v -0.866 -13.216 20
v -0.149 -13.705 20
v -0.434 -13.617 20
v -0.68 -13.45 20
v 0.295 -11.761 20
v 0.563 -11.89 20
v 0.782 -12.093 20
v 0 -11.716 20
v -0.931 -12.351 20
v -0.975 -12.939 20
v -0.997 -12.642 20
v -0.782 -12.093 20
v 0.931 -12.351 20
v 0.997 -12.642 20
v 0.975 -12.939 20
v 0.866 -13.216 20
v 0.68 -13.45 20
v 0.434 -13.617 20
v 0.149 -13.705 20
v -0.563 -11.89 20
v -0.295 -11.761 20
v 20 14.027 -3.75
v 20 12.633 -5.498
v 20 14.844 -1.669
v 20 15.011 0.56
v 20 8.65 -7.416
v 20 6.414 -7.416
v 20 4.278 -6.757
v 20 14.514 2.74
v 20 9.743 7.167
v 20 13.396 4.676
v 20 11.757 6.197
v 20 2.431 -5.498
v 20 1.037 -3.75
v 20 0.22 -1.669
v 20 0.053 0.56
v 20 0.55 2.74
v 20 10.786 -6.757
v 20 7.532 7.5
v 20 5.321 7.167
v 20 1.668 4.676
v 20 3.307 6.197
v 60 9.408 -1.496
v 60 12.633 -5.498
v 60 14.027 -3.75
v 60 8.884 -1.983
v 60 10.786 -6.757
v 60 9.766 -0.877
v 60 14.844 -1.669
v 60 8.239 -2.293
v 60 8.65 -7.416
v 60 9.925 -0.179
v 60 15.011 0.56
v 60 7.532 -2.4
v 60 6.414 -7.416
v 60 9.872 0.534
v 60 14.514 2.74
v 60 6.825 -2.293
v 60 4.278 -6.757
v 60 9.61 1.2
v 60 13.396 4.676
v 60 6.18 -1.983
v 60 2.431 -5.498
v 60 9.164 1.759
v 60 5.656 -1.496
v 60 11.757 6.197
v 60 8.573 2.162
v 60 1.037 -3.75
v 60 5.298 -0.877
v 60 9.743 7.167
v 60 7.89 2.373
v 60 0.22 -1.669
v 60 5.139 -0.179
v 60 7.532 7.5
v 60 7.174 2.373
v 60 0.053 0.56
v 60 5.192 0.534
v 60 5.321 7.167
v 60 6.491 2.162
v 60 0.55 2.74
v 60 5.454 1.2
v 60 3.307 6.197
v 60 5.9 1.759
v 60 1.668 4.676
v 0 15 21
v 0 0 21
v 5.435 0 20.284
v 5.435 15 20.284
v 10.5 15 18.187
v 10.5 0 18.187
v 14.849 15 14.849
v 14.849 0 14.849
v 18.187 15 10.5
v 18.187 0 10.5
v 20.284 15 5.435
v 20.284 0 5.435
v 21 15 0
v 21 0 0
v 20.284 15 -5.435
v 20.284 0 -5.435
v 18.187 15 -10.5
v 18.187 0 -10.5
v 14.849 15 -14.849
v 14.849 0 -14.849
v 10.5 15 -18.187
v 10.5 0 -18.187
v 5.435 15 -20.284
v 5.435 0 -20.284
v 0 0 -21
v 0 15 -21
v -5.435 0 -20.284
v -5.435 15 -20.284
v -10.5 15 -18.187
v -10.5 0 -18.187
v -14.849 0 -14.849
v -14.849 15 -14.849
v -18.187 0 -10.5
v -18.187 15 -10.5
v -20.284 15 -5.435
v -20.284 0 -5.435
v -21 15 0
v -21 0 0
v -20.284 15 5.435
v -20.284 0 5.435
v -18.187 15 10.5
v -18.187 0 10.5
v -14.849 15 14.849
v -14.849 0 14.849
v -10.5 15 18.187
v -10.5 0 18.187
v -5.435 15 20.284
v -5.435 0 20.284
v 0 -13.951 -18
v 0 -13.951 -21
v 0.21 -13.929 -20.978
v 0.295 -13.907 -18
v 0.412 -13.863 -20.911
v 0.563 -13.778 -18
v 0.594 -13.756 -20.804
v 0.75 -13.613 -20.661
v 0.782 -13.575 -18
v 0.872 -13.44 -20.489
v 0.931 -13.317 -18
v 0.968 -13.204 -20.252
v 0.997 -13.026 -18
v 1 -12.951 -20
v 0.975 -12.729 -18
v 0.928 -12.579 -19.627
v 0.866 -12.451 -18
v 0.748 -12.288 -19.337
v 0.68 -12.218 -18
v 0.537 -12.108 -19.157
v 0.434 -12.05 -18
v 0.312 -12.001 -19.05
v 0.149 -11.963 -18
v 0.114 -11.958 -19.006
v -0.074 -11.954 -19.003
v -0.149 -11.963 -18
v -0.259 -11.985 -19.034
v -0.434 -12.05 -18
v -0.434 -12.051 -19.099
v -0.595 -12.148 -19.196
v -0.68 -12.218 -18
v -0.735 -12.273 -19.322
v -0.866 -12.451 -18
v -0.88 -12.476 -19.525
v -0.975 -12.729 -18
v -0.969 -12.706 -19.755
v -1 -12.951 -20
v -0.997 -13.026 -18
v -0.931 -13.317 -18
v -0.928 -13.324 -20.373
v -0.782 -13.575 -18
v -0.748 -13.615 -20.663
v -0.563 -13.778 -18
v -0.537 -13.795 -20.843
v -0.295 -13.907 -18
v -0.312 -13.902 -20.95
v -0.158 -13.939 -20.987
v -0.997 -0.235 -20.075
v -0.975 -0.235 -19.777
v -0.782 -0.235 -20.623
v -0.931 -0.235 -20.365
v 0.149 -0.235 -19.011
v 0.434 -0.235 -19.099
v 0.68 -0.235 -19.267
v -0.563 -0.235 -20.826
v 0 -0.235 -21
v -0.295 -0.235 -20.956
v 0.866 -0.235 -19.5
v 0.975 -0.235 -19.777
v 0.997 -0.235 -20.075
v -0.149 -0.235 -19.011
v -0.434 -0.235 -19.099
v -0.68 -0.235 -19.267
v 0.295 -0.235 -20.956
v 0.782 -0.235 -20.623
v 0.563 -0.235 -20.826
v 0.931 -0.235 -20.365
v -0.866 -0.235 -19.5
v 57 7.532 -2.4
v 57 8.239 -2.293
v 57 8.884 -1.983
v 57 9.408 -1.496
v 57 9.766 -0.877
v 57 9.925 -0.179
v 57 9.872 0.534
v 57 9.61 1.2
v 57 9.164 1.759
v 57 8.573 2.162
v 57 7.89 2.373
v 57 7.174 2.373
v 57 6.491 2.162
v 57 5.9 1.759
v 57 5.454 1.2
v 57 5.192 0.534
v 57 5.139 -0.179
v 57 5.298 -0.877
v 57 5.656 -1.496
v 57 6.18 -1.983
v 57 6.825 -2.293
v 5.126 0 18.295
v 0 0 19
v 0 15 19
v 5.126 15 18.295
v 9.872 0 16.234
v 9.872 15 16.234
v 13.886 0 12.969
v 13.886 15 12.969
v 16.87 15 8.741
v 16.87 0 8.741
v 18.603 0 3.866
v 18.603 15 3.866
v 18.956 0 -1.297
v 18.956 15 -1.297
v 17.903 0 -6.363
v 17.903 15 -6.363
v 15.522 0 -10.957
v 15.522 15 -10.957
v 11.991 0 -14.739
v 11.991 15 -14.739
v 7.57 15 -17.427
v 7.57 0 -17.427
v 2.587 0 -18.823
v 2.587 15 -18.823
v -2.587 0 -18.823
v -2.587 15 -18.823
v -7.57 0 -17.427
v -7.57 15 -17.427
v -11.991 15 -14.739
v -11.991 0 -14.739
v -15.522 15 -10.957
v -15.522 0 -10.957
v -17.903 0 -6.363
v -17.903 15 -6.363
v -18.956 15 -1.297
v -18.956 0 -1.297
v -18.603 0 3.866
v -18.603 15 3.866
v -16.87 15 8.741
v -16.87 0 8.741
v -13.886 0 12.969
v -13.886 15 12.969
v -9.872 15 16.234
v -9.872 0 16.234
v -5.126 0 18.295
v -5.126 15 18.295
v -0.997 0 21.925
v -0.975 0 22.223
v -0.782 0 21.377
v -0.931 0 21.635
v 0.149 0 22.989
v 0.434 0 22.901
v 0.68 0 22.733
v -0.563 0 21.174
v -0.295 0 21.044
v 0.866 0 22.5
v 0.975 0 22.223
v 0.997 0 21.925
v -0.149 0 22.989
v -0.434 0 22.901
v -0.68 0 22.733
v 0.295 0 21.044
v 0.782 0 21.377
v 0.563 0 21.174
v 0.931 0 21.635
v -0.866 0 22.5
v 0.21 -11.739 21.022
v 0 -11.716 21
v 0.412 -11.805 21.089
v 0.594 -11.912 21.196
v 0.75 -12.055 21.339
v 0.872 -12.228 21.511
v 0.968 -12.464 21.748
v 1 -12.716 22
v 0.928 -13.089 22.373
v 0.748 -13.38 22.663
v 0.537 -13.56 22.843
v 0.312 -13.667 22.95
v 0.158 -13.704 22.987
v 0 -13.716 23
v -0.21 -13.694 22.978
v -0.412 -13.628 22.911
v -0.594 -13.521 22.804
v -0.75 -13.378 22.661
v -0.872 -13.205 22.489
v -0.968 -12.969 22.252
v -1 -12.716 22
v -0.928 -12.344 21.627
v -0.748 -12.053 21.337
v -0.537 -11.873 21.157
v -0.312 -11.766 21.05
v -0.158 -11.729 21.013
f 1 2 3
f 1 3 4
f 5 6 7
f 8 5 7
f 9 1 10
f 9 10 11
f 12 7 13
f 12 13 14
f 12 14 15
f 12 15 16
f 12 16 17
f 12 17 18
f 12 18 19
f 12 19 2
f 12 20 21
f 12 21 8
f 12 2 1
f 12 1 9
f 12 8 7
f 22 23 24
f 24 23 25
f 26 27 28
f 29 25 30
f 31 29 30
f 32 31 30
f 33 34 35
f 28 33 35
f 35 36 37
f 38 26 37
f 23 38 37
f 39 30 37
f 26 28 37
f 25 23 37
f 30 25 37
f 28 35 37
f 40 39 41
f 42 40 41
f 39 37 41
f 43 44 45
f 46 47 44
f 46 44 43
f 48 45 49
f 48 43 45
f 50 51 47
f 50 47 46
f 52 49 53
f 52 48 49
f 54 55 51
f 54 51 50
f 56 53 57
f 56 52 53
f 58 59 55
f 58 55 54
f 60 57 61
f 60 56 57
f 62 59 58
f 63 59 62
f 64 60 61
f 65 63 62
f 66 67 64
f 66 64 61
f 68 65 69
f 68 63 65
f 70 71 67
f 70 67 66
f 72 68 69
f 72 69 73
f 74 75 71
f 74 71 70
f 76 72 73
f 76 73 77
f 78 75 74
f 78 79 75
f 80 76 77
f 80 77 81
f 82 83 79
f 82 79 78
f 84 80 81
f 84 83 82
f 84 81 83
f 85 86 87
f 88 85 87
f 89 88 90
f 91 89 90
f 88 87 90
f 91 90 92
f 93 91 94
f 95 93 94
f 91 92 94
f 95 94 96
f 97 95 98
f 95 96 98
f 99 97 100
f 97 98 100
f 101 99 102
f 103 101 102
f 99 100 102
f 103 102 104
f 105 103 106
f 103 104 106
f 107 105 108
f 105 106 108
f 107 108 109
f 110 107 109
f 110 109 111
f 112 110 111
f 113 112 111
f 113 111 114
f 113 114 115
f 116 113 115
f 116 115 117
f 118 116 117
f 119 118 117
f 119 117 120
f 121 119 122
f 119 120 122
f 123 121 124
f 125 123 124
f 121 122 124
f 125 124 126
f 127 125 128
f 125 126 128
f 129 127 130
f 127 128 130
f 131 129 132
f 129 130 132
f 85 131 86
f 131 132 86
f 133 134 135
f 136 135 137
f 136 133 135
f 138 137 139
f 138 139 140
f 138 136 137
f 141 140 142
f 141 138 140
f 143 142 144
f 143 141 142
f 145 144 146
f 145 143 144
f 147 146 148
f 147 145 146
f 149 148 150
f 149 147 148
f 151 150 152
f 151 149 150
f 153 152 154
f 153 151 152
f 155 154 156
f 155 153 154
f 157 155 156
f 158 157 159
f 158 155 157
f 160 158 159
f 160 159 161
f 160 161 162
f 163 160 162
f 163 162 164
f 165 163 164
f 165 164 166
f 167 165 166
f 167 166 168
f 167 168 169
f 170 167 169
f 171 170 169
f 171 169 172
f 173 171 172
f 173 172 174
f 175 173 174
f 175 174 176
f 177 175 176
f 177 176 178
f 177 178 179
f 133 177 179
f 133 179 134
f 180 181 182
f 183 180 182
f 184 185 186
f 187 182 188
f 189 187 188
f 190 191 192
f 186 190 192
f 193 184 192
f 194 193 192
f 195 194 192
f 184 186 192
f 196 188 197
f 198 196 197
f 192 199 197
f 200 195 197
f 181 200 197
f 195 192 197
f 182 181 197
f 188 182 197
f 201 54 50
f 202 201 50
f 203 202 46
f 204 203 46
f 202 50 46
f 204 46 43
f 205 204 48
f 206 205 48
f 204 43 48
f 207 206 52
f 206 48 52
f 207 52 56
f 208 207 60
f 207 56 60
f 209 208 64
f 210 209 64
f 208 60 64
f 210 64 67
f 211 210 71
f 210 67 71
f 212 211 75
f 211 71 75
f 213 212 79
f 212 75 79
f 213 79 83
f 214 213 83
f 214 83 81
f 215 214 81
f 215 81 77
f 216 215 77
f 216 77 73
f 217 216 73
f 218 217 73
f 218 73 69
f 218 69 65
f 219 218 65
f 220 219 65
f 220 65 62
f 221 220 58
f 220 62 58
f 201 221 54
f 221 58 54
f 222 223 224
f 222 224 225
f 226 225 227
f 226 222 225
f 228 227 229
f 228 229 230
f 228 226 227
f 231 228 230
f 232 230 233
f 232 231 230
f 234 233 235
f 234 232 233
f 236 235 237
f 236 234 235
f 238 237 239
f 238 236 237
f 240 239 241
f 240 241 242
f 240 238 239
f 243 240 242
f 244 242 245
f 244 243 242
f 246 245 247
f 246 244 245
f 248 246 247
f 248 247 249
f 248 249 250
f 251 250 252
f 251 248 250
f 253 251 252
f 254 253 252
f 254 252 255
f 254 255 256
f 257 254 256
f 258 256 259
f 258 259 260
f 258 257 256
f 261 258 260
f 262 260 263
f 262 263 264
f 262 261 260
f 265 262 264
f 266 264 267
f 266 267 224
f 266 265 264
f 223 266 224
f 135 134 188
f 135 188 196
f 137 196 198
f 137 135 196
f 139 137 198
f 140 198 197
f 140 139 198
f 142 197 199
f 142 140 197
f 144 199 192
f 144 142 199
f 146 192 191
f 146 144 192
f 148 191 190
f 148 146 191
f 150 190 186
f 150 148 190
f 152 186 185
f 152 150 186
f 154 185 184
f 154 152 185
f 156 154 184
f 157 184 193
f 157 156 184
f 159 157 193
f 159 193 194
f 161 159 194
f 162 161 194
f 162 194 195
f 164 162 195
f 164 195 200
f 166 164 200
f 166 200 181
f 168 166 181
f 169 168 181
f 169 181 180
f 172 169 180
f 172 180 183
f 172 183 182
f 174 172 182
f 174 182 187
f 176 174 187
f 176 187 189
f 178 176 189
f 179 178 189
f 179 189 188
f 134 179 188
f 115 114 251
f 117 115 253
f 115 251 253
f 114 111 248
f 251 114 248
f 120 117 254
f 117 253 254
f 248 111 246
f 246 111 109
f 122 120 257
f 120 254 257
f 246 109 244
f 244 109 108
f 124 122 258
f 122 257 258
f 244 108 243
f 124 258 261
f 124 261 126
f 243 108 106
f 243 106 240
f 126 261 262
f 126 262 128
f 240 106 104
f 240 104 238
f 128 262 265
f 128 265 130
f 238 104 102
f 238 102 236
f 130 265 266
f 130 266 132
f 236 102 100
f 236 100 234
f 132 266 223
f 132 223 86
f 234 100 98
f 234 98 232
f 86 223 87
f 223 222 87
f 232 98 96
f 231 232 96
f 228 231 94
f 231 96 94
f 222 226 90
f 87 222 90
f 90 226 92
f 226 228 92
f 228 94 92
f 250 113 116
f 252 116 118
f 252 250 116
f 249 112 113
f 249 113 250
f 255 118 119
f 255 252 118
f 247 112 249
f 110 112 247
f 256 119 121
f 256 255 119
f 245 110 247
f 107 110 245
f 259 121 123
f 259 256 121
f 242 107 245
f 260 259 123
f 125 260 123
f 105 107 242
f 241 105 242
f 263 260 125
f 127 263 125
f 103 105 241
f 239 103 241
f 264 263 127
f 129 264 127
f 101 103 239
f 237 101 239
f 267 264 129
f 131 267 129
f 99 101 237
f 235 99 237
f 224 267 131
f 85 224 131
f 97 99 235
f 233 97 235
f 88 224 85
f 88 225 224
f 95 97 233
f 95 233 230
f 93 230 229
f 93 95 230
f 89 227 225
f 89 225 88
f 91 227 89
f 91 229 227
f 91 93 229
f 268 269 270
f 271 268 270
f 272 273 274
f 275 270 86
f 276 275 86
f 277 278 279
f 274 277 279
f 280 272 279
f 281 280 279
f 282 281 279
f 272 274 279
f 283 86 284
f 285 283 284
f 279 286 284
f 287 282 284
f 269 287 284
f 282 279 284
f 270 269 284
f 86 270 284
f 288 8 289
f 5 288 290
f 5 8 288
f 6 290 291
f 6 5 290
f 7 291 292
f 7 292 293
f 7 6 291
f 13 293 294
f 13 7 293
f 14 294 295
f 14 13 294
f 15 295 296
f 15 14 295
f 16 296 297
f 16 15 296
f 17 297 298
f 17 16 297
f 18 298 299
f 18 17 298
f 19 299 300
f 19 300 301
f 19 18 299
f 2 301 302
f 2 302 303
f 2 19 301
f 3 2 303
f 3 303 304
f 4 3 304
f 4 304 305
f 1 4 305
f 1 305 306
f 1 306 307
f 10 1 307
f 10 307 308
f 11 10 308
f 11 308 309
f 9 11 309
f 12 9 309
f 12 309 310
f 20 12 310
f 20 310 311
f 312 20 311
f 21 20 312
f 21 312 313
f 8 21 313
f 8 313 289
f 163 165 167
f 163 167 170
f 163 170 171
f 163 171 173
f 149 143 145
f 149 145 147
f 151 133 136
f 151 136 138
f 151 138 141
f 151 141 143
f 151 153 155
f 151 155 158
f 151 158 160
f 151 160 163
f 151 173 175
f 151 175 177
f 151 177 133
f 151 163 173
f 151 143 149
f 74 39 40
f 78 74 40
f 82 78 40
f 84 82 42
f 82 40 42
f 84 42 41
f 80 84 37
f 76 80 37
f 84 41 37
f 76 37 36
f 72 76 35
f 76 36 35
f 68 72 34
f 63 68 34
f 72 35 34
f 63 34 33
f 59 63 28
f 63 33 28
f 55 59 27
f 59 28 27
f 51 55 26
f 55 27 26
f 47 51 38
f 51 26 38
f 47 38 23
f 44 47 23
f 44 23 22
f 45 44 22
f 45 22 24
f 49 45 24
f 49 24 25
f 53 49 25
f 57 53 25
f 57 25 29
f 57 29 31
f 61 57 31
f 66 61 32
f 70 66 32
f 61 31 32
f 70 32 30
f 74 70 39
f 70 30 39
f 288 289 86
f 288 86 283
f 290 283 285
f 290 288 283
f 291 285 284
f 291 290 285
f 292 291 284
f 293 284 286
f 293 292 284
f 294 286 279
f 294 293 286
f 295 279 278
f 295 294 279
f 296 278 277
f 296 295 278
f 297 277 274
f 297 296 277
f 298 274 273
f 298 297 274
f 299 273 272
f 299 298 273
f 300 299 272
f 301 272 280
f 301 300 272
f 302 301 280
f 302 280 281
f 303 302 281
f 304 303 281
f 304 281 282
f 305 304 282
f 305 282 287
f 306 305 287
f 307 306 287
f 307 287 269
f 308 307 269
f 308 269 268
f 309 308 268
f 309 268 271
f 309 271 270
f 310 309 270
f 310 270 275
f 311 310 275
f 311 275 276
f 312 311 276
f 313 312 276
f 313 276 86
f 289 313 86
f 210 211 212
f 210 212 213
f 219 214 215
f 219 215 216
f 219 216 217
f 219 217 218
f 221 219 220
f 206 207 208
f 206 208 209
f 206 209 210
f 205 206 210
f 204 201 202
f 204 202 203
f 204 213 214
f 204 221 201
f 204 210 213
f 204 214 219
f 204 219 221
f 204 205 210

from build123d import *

# Parameters (mm, degrees)
SKETCH1_R           = 21
SKETCH1_R_2         = 19
BOSS_EXTRUDE1_DEPTH = 15
SKETCH2_R           = 7.5
BOSS_EXTRUDE2_DEPTH = 40
SKETCH3_R           = 2.4
CUT_EXTRUDE1_DEPTH  = 3
SWEEP4_PROFILE_R    = 1
SWEEP5_PROFILE_R    = 1


with BuildPart() as part:
    # Sketch1 → Boss-Extrude1 (new body)
    with BuildSketch(Plane(origin=(0, 0, 0), x_dir=(1, 0, 0), z_dir=(0, 1, 0))):
        with Locations(Location((0, 0, 0), (0, 0, 270))):
            Circle(SKETCH1_R)
        with Locations(Location((0, 0, 0), (0, 0, 270))):
            Circle(SKETCH1_R_2, mode=Mode.SUBTRACT)
    extrude(amount=BOSS_EXTRUDE1_DEPTH)


with BuildPart() as body_2:
    # Sketch2 → Boss-Extrude2 (new body)
    with BuildSketch(Plane(origin=(20, 0, 0), x_dir=(0, 0, -1), z_dir=(1, 0, 0))):
        with Locations(Location((0, 7.532005334, 0), (0, 0, 180))):
            Circle(SKETCH2_R)
    extrude(amount=BOSS_EXTRUDE2_DEPTH)

    # Sketch3 → Cut-Extrude1 (cut)
    with BuildSketch(Plane(origin=(60, 0, 0), x_dir=(0, 0, -1), z_dir=(1, 0, 0))):
        with Locations((0, 7.532005334)):
            Circle(SKETCH3_R)
    extrude(amount=-CUT_EXTRUDE1_DEPTH, mode=Mode.SUBTRACT)


with BuildPart() as body_3:
    # Sweep4: sweep along a path in Sketch5
    with BuildLine(Plane(origin=(0, 0, 0), x_dir=(0, 0, -1), z_dir=(1, 0, 0))) as sweep4_path:
        Line((-22, 0), (-22, -12.716489415))
        Line((-22, -12.716489415), (-20, -12.716489415))
    # Sweep4 profile (on start of the path) → Sweep4 (sweep)
    with BuildSketch(Plane(origin=(0, 0, 22), x_dir=(0, 0, -1), z_dir=(0, -1, 0))):
        Circle(SWEEP4_PROFILE_R)
    sweep(path=sweep4_path.line, transition=Transition.RIGHT)


with BuildPart() as body_4:
    # Sweep5: sweep along a path in Sketch89
    with BuildLine(Plane(origin=(0, 0, 0), x_dir=(0, 0, -1), z_dir=(1, 0, 0))) as sweep5_path:
        Line((20, -0.234854142), (20, -12.951343557))
        Line((20, -12.951343557), (18, -12.951343557))
    # Sweep5 profile (on start of the path) → Sweep5 (sweep)
    with BuildSketch(Plane(origin=(0, -0.234854142, -20), x_dir=(0, 0, -1), z_dir=(0, -1, 0))):
        Circle(SWEEP5_PROFILE_R)
    sweep(path=sweep5_path.line, transition=Transition.RIGHT)


solid = Compound([part.part, body_2.part, body_3.part, body_4.part])
